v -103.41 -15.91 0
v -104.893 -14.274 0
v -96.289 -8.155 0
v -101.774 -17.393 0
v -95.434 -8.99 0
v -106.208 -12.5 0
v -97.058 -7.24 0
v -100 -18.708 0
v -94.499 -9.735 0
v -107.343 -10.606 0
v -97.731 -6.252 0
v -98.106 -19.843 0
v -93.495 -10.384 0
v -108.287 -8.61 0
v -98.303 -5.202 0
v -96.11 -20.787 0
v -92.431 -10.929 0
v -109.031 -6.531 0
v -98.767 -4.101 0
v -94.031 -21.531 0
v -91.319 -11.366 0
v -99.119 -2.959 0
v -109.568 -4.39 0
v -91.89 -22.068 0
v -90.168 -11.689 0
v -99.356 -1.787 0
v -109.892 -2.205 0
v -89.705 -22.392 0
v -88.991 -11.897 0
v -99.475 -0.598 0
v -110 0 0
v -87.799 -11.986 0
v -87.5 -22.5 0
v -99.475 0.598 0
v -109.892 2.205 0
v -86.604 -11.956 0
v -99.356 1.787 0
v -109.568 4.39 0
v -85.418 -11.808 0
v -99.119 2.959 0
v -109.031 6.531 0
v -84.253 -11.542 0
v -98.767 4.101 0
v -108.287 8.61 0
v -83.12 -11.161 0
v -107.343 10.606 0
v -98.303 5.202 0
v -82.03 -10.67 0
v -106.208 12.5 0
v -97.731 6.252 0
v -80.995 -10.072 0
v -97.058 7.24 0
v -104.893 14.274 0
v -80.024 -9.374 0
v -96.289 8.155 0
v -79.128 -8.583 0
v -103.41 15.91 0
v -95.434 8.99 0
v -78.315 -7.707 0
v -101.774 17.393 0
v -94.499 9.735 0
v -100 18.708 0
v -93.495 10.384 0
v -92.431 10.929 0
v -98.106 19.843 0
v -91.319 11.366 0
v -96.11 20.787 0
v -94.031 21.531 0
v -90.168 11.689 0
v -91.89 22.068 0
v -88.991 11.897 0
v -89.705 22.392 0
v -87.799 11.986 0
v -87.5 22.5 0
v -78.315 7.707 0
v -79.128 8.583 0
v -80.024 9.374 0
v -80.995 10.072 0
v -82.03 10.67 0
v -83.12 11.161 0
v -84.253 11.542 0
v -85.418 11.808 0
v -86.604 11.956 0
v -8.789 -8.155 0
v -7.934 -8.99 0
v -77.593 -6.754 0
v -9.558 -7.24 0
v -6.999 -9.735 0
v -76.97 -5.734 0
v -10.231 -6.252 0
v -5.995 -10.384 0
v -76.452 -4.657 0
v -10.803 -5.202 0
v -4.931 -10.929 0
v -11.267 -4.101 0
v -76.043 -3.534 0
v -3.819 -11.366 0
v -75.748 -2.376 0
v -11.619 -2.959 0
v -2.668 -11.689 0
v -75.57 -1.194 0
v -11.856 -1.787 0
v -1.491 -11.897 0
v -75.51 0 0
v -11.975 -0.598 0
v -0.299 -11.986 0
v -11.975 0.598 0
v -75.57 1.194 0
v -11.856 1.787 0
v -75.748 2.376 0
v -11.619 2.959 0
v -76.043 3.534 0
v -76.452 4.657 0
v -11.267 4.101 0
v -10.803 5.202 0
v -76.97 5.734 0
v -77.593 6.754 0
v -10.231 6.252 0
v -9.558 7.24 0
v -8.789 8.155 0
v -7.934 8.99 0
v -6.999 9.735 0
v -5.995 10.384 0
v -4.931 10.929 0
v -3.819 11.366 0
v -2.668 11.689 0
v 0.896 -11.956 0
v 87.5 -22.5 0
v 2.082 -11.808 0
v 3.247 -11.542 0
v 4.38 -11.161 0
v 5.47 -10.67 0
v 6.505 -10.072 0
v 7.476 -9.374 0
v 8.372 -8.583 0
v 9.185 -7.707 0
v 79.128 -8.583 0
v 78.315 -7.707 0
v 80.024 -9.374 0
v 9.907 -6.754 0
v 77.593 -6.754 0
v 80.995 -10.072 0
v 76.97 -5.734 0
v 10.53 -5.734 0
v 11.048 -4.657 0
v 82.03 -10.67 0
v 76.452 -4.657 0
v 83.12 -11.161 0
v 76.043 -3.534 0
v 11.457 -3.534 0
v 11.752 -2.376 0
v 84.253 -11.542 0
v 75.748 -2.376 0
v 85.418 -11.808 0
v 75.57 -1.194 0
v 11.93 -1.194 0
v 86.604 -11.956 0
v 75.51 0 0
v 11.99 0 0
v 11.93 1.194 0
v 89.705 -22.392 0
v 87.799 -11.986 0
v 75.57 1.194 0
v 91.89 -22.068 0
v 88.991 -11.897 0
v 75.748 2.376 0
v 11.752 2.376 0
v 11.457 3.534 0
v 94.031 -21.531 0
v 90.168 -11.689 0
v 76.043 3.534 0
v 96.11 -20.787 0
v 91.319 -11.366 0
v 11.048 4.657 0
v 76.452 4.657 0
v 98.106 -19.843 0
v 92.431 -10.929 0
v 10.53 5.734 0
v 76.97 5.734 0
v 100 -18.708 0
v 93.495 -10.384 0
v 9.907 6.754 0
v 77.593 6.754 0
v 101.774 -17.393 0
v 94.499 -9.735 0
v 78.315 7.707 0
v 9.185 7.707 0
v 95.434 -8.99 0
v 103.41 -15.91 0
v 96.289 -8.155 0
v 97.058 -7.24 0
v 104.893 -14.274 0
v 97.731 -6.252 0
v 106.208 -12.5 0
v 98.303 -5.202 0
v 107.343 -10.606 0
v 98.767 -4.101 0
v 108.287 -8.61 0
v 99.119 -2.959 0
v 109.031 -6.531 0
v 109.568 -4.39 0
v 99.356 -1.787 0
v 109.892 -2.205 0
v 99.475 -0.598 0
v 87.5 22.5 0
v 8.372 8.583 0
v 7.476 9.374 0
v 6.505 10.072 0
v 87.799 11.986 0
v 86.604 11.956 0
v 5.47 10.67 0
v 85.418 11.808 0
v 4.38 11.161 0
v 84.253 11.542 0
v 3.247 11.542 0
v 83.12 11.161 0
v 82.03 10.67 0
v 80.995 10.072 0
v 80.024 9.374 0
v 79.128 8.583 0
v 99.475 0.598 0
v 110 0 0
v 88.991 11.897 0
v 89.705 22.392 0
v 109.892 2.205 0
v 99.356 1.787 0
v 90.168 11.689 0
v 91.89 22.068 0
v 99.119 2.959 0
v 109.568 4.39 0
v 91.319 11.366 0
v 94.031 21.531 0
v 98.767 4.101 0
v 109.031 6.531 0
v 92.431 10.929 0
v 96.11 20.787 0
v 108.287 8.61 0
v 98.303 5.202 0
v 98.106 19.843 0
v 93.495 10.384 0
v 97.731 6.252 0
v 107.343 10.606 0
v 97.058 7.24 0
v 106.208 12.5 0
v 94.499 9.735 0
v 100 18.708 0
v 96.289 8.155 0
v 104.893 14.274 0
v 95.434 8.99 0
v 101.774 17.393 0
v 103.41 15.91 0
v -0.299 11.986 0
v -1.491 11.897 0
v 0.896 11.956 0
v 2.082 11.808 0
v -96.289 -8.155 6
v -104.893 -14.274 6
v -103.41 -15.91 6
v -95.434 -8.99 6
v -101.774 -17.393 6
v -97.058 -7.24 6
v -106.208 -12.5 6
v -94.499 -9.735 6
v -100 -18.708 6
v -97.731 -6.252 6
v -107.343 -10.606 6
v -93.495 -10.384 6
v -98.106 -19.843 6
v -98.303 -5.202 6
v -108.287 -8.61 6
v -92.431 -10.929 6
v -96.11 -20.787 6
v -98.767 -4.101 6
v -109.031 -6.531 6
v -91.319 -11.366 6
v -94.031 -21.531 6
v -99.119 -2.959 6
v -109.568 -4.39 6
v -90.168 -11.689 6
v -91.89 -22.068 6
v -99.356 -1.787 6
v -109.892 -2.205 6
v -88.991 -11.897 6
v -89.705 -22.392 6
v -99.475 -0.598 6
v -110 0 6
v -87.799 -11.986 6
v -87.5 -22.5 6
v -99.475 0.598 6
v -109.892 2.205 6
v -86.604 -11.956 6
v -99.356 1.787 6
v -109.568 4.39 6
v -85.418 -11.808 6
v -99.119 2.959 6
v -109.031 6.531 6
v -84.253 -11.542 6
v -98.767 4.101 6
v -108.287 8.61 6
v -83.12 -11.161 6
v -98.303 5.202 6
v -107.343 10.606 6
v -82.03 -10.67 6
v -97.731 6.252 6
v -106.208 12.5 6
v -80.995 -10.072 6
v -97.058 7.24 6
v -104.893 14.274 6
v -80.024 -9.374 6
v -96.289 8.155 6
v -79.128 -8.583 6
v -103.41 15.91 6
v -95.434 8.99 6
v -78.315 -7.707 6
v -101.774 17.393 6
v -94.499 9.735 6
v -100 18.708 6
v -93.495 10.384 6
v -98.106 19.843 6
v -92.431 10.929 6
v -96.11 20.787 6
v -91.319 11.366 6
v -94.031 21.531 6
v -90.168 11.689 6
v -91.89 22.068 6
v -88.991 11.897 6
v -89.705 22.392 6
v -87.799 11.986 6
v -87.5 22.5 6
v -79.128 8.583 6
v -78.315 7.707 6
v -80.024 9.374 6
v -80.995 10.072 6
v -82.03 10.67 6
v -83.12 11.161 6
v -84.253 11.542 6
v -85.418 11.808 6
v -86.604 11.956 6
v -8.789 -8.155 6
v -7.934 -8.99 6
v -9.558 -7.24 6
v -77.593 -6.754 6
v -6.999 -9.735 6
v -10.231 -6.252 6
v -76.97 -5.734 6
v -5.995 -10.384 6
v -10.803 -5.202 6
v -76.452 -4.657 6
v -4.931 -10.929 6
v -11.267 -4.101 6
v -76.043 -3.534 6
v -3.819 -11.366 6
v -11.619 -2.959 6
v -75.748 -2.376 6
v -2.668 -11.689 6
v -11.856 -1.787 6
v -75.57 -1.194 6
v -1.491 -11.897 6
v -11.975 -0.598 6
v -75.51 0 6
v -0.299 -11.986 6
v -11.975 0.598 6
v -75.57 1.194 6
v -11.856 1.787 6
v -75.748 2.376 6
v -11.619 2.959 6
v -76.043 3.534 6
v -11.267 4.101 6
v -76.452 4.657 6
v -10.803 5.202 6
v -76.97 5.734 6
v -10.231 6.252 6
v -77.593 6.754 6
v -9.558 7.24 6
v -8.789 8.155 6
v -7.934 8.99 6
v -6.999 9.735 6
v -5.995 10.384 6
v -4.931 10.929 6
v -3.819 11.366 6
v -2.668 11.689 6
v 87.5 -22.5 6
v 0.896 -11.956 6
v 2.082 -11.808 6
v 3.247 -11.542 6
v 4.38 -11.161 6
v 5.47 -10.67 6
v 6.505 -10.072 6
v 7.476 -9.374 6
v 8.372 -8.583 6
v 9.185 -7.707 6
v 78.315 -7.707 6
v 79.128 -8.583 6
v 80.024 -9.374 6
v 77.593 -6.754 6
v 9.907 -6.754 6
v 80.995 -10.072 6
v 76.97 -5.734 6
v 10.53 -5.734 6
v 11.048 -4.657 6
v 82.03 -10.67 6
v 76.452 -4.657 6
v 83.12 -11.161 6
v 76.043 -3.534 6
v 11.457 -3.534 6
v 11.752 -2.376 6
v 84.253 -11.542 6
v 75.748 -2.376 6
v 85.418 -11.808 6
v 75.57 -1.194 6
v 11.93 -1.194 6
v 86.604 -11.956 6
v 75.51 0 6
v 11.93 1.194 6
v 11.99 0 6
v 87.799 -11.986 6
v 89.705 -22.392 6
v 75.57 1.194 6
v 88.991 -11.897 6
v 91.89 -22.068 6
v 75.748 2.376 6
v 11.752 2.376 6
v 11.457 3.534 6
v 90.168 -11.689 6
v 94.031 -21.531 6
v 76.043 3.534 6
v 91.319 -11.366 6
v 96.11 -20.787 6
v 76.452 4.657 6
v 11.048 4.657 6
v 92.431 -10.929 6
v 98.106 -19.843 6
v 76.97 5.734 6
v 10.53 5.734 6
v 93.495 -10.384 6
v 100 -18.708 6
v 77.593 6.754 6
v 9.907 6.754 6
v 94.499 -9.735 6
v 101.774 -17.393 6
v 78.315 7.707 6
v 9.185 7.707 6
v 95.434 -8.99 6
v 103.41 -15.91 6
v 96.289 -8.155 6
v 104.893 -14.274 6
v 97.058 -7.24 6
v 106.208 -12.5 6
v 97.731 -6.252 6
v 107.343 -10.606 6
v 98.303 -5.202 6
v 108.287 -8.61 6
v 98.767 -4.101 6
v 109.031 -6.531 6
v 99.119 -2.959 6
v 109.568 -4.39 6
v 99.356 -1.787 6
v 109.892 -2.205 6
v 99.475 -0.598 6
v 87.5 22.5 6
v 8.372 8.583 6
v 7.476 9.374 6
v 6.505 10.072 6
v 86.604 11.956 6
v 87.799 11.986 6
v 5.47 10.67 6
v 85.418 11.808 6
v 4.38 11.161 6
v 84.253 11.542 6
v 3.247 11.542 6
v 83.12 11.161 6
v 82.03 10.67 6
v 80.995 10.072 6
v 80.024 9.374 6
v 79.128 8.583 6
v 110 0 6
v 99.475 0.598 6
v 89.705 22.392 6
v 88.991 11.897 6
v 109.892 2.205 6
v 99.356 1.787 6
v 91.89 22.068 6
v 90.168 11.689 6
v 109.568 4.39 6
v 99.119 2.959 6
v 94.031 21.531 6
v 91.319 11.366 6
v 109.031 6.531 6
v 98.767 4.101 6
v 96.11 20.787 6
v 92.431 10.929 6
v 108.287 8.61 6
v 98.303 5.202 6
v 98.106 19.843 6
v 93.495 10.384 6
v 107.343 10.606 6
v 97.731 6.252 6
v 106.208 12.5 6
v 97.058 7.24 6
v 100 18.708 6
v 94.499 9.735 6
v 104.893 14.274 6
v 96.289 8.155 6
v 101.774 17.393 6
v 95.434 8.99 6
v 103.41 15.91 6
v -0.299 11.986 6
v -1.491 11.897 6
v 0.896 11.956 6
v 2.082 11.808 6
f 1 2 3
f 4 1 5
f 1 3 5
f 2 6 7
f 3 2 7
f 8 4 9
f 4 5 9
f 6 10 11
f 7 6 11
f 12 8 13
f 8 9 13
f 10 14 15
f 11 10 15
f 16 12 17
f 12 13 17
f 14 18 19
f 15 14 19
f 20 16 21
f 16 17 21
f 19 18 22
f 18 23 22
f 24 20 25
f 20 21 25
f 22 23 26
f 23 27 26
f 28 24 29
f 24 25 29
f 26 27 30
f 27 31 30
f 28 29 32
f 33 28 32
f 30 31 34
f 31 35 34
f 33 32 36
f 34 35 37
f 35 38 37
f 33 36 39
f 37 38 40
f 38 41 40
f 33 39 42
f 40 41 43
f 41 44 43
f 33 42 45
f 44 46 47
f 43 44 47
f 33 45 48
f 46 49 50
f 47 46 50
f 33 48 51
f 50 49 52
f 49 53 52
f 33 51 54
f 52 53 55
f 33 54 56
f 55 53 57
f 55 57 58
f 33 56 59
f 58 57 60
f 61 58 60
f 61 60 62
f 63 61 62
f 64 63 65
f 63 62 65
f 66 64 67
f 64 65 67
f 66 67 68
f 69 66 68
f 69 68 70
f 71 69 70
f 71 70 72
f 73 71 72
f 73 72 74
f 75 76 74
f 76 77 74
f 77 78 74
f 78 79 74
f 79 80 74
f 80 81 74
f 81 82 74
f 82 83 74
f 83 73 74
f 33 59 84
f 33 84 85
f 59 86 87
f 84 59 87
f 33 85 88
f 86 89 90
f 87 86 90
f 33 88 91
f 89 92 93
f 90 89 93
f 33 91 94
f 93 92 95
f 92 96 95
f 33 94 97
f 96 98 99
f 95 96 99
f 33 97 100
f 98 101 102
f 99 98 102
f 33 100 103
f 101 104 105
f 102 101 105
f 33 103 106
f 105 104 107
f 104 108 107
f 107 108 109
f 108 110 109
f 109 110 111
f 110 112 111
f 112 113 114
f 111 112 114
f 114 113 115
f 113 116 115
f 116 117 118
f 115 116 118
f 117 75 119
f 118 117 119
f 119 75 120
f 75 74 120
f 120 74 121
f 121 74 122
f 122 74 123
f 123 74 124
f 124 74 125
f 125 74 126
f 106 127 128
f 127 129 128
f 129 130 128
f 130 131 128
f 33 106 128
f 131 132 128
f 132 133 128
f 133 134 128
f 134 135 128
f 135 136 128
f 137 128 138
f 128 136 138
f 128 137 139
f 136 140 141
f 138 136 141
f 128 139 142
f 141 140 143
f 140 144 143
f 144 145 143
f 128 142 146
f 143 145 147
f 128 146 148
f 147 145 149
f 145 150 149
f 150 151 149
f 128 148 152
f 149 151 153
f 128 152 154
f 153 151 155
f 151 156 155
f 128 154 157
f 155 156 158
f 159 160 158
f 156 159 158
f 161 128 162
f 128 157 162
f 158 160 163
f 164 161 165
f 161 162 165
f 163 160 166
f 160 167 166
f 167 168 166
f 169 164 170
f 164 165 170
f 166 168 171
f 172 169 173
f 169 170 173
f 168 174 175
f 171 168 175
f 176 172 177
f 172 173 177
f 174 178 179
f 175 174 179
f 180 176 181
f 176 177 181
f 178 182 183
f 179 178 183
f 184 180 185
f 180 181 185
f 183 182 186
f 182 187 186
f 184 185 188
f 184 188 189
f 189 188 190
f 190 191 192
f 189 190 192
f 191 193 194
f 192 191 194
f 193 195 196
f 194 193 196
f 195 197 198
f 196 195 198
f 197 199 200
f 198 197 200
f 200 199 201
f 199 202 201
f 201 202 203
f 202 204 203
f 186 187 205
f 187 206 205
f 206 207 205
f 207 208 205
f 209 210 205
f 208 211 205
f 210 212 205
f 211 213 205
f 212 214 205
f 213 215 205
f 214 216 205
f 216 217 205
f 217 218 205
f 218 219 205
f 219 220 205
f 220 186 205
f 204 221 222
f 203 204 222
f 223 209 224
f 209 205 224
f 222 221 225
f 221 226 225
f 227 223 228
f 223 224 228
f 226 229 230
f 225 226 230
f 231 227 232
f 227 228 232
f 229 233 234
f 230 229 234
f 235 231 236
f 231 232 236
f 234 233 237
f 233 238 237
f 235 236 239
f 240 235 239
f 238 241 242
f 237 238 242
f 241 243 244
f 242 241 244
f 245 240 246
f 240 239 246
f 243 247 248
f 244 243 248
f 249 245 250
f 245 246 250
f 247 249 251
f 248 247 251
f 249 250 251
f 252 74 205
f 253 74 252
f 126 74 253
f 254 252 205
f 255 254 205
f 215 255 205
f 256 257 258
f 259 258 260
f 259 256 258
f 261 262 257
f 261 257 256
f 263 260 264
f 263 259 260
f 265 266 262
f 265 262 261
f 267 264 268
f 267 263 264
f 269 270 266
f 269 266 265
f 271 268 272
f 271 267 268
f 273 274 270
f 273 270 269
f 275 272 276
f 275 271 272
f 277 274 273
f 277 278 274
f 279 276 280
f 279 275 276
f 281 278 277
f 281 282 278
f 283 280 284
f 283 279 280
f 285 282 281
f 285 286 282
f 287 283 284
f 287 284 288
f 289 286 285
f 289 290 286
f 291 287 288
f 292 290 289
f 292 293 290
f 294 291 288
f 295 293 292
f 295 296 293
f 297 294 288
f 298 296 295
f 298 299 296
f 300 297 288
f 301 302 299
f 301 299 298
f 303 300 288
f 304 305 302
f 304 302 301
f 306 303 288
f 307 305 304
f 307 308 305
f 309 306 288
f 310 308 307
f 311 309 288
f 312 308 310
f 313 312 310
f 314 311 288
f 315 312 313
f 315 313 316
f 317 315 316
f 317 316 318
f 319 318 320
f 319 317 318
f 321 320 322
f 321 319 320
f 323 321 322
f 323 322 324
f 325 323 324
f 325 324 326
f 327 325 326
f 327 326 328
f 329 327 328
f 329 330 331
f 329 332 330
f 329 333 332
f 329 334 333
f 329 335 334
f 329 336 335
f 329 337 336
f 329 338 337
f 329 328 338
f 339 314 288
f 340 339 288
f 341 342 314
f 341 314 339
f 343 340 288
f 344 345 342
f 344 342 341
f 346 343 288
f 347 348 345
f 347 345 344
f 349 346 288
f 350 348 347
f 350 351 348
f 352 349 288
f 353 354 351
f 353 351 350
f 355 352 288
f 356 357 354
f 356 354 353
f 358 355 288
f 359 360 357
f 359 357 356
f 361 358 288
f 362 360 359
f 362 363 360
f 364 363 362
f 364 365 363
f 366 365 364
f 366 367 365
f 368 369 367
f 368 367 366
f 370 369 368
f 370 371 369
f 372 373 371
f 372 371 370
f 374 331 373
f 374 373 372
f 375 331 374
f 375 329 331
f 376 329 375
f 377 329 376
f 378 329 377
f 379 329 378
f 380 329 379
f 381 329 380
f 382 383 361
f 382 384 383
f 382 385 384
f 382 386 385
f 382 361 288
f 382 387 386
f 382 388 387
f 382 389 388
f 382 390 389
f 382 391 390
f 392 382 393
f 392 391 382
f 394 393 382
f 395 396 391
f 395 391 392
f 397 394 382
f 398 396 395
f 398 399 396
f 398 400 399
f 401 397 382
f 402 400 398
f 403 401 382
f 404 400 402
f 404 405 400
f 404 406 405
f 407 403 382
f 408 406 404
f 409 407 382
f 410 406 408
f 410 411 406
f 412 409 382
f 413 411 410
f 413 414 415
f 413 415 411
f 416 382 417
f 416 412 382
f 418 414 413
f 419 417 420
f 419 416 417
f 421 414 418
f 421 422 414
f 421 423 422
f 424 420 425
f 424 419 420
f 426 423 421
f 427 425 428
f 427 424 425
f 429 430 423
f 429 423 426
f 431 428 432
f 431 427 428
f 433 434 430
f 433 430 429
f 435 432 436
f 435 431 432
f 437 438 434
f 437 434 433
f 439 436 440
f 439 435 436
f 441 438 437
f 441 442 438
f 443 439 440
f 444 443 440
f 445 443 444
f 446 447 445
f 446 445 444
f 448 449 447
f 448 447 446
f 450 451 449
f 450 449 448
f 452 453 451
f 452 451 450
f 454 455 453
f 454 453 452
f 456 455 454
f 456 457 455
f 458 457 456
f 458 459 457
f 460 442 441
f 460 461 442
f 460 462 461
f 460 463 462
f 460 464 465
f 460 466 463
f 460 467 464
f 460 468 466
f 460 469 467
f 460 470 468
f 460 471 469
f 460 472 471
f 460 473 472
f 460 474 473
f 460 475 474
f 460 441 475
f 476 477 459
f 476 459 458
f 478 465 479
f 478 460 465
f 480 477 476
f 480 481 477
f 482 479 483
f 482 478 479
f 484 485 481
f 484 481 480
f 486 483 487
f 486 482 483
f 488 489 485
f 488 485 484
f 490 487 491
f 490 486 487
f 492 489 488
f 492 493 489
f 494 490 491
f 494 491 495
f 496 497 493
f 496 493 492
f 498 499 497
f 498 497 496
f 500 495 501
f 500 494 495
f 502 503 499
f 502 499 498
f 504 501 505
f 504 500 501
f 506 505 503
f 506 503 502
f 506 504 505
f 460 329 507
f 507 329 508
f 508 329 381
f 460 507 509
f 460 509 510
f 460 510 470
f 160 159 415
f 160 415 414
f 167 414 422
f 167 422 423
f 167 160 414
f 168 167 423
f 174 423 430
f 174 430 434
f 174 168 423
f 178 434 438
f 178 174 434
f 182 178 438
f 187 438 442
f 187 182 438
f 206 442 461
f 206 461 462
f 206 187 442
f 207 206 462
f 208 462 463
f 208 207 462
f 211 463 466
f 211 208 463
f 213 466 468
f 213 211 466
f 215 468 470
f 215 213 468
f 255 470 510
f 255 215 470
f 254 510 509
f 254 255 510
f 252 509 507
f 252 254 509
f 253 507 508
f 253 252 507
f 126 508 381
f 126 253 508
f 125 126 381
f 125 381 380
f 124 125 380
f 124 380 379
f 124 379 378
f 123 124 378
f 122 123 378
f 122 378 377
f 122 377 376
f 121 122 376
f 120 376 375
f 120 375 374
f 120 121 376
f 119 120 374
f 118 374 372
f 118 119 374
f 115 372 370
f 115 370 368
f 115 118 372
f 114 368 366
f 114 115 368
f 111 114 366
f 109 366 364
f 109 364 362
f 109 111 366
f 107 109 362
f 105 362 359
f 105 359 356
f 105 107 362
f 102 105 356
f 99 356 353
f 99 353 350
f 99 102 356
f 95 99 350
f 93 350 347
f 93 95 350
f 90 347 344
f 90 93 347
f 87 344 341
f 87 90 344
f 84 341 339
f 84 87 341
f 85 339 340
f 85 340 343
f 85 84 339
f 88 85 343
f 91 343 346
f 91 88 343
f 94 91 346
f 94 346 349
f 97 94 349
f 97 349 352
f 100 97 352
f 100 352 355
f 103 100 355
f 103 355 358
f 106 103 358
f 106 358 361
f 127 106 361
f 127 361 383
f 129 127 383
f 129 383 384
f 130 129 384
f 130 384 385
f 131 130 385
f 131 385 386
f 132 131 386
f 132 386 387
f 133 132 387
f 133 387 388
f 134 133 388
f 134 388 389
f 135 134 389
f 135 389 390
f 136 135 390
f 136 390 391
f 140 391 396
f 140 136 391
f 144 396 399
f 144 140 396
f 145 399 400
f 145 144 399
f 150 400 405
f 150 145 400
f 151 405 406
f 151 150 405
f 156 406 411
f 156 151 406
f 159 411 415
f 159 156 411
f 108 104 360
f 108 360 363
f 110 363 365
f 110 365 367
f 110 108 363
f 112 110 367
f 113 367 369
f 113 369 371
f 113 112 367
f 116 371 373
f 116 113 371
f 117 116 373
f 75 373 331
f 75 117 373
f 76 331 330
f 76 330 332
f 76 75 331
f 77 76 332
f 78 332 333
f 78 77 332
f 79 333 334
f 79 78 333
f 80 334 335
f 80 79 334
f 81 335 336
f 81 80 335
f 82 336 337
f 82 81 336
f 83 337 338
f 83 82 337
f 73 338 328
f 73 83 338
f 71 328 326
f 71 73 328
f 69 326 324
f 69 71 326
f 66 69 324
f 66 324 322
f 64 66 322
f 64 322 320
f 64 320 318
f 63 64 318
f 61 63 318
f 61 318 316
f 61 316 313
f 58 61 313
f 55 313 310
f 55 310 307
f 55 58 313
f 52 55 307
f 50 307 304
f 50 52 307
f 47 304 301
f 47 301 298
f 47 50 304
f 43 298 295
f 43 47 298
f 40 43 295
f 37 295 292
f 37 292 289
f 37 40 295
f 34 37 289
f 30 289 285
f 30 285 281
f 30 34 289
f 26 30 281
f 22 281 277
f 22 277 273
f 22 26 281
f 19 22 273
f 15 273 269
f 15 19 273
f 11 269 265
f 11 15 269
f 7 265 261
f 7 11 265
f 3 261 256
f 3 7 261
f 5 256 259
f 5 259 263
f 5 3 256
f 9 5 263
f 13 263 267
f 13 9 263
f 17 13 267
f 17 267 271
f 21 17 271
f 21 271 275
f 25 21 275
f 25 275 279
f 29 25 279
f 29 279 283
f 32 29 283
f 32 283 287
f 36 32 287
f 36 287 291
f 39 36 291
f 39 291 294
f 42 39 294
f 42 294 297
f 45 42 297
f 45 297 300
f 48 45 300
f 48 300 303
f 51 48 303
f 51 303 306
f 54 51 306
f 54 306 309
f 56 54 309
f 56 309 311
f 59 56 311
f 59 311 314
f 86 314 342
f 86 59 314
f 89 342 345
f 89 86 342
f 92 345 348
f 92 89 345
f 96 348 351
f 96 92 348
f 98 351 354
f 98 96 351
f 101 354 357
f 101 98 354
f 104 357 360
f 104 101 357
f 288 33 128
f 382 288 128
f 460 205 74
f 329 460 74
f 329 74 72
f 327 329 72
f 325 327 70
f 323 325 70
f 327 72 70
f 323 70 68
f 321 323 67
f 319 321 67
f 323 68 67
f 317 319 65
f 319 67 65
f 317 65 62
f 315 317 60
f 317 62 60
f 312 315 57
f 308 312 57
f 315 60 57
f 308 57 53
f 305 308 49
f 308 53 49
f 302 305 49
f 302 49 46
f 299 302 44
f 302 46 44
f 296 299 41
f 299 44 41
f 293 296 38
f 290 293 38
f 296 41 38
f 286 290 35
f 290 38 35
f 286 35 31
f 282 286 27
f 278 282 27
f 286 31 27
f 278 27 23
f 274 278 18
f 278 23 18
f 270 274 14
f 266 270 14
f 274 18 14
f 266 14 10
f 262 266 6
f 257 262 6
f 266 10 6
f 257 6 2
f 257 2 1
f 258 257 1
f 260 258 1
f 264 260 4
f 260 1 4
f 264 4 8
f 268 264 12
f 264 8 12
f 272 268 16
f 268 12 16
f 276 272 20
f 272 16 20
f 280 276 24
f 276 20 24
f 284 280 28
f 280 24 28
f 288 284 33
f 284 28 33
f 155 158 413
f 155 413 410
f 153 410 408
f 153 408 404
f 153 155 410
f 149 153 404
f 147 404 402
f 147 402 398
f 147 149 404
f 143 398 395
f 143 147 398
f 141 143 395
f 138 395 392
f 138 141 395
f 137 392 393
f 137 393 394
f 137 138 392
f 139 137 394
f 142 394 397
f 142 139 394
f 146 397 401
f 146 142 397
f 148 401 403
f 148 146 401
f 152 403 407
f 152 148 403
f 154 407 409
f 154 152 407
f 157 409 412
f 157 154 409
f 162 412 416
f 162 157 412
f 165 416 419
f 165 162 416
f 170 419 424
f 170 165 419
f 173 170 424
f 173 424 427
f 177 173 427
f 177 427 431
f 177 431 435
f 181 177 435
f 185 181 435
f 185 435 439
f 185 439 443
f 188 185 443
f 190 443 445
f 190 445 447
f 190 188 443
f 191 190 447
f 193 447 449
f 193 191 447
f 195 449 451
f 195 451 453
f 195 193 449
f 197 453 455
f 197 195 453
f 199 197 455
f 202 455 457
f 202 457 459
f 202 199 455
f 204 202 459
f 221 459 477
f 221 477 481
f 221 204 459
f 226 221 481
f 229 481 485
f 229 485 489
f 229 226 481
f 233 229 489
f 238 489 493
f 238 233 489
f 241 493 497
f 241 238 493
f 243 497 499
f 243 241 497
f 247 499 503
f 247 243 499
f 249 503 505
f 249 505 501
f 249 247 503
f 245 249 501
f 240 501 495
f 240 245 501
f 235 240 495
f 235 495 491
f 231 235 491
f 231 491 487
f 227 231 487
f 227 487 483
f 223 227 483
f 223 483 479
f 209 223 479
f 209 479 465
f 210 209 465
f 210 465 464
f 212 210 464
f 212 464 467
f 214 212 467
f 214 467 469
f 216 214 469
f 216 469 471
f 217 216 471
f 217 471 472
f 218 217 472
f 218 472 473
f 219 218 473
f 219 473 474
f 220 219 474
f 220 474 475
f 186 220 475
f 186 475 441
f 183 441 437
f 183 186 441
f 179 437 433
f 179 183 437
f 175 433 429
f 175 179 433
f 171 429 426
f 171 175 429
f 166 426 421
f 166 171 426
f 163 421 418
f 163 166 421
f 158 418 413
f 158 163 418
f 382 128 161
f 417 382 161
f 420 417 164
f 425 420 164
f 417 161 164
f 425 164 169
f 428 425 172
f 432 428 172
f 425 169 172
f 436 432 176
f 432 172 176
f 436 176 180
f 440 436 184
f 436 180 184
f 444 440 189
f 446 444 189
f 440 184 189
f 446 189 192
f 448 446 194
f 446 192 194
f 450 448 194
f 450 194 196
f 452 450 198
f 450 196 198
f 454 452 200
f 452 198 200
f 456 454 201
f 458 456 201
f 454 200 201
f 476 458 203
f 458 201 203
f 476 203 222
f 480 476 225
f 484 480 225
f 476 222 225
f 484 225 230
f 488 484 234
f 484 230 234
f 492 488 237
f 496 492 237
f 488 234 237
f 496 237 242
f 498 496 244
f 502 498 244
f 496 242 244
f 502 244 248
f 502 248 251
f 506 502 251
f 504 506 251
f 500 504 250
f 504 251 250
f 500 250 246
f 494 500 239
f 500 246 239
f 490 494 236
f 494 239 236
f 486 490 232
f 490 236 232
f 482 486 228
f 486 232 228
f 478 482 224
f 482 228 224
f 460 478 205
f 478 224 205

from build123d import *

# Parameters (mm, degrees)
SKETCH2_R           = 11.99
BOSS_EXTRUDE1_DEPTH = 6


with BuildPart() as part:
    # Sketch2 → Boss-Extrude1 (new body)
    with BuildSketch(Plane.XY):
        with BuildLine():
            Line((-87.5, -22.5), (87.5, -22.5))
            ThreePointArc((87.5, -22.5), (110, 0), (87.5, 22.5))
            Line((87.5, 22.5), (-87.5, 22.5))
            ThreePointArc((-87.5, 22.5), (-110, 0), (-87.5, -22.5))
        make_face()
        with Locations((-87.5, 0)):
            Circle(SKETCH2_R, mode=Mode.SUBTRACT)
        with Locations(Location((87.5, 0, 0), (0, 0, 180))):
            Circle(SKETCH2_R, mode=Mode.SUBTRACT)
        Circle(SKETCH2_R, mode=Mode.SUBTRACT)
    extrude(amount=BOSS_EXTRUDE1_DEPTH)


solid = part.part
